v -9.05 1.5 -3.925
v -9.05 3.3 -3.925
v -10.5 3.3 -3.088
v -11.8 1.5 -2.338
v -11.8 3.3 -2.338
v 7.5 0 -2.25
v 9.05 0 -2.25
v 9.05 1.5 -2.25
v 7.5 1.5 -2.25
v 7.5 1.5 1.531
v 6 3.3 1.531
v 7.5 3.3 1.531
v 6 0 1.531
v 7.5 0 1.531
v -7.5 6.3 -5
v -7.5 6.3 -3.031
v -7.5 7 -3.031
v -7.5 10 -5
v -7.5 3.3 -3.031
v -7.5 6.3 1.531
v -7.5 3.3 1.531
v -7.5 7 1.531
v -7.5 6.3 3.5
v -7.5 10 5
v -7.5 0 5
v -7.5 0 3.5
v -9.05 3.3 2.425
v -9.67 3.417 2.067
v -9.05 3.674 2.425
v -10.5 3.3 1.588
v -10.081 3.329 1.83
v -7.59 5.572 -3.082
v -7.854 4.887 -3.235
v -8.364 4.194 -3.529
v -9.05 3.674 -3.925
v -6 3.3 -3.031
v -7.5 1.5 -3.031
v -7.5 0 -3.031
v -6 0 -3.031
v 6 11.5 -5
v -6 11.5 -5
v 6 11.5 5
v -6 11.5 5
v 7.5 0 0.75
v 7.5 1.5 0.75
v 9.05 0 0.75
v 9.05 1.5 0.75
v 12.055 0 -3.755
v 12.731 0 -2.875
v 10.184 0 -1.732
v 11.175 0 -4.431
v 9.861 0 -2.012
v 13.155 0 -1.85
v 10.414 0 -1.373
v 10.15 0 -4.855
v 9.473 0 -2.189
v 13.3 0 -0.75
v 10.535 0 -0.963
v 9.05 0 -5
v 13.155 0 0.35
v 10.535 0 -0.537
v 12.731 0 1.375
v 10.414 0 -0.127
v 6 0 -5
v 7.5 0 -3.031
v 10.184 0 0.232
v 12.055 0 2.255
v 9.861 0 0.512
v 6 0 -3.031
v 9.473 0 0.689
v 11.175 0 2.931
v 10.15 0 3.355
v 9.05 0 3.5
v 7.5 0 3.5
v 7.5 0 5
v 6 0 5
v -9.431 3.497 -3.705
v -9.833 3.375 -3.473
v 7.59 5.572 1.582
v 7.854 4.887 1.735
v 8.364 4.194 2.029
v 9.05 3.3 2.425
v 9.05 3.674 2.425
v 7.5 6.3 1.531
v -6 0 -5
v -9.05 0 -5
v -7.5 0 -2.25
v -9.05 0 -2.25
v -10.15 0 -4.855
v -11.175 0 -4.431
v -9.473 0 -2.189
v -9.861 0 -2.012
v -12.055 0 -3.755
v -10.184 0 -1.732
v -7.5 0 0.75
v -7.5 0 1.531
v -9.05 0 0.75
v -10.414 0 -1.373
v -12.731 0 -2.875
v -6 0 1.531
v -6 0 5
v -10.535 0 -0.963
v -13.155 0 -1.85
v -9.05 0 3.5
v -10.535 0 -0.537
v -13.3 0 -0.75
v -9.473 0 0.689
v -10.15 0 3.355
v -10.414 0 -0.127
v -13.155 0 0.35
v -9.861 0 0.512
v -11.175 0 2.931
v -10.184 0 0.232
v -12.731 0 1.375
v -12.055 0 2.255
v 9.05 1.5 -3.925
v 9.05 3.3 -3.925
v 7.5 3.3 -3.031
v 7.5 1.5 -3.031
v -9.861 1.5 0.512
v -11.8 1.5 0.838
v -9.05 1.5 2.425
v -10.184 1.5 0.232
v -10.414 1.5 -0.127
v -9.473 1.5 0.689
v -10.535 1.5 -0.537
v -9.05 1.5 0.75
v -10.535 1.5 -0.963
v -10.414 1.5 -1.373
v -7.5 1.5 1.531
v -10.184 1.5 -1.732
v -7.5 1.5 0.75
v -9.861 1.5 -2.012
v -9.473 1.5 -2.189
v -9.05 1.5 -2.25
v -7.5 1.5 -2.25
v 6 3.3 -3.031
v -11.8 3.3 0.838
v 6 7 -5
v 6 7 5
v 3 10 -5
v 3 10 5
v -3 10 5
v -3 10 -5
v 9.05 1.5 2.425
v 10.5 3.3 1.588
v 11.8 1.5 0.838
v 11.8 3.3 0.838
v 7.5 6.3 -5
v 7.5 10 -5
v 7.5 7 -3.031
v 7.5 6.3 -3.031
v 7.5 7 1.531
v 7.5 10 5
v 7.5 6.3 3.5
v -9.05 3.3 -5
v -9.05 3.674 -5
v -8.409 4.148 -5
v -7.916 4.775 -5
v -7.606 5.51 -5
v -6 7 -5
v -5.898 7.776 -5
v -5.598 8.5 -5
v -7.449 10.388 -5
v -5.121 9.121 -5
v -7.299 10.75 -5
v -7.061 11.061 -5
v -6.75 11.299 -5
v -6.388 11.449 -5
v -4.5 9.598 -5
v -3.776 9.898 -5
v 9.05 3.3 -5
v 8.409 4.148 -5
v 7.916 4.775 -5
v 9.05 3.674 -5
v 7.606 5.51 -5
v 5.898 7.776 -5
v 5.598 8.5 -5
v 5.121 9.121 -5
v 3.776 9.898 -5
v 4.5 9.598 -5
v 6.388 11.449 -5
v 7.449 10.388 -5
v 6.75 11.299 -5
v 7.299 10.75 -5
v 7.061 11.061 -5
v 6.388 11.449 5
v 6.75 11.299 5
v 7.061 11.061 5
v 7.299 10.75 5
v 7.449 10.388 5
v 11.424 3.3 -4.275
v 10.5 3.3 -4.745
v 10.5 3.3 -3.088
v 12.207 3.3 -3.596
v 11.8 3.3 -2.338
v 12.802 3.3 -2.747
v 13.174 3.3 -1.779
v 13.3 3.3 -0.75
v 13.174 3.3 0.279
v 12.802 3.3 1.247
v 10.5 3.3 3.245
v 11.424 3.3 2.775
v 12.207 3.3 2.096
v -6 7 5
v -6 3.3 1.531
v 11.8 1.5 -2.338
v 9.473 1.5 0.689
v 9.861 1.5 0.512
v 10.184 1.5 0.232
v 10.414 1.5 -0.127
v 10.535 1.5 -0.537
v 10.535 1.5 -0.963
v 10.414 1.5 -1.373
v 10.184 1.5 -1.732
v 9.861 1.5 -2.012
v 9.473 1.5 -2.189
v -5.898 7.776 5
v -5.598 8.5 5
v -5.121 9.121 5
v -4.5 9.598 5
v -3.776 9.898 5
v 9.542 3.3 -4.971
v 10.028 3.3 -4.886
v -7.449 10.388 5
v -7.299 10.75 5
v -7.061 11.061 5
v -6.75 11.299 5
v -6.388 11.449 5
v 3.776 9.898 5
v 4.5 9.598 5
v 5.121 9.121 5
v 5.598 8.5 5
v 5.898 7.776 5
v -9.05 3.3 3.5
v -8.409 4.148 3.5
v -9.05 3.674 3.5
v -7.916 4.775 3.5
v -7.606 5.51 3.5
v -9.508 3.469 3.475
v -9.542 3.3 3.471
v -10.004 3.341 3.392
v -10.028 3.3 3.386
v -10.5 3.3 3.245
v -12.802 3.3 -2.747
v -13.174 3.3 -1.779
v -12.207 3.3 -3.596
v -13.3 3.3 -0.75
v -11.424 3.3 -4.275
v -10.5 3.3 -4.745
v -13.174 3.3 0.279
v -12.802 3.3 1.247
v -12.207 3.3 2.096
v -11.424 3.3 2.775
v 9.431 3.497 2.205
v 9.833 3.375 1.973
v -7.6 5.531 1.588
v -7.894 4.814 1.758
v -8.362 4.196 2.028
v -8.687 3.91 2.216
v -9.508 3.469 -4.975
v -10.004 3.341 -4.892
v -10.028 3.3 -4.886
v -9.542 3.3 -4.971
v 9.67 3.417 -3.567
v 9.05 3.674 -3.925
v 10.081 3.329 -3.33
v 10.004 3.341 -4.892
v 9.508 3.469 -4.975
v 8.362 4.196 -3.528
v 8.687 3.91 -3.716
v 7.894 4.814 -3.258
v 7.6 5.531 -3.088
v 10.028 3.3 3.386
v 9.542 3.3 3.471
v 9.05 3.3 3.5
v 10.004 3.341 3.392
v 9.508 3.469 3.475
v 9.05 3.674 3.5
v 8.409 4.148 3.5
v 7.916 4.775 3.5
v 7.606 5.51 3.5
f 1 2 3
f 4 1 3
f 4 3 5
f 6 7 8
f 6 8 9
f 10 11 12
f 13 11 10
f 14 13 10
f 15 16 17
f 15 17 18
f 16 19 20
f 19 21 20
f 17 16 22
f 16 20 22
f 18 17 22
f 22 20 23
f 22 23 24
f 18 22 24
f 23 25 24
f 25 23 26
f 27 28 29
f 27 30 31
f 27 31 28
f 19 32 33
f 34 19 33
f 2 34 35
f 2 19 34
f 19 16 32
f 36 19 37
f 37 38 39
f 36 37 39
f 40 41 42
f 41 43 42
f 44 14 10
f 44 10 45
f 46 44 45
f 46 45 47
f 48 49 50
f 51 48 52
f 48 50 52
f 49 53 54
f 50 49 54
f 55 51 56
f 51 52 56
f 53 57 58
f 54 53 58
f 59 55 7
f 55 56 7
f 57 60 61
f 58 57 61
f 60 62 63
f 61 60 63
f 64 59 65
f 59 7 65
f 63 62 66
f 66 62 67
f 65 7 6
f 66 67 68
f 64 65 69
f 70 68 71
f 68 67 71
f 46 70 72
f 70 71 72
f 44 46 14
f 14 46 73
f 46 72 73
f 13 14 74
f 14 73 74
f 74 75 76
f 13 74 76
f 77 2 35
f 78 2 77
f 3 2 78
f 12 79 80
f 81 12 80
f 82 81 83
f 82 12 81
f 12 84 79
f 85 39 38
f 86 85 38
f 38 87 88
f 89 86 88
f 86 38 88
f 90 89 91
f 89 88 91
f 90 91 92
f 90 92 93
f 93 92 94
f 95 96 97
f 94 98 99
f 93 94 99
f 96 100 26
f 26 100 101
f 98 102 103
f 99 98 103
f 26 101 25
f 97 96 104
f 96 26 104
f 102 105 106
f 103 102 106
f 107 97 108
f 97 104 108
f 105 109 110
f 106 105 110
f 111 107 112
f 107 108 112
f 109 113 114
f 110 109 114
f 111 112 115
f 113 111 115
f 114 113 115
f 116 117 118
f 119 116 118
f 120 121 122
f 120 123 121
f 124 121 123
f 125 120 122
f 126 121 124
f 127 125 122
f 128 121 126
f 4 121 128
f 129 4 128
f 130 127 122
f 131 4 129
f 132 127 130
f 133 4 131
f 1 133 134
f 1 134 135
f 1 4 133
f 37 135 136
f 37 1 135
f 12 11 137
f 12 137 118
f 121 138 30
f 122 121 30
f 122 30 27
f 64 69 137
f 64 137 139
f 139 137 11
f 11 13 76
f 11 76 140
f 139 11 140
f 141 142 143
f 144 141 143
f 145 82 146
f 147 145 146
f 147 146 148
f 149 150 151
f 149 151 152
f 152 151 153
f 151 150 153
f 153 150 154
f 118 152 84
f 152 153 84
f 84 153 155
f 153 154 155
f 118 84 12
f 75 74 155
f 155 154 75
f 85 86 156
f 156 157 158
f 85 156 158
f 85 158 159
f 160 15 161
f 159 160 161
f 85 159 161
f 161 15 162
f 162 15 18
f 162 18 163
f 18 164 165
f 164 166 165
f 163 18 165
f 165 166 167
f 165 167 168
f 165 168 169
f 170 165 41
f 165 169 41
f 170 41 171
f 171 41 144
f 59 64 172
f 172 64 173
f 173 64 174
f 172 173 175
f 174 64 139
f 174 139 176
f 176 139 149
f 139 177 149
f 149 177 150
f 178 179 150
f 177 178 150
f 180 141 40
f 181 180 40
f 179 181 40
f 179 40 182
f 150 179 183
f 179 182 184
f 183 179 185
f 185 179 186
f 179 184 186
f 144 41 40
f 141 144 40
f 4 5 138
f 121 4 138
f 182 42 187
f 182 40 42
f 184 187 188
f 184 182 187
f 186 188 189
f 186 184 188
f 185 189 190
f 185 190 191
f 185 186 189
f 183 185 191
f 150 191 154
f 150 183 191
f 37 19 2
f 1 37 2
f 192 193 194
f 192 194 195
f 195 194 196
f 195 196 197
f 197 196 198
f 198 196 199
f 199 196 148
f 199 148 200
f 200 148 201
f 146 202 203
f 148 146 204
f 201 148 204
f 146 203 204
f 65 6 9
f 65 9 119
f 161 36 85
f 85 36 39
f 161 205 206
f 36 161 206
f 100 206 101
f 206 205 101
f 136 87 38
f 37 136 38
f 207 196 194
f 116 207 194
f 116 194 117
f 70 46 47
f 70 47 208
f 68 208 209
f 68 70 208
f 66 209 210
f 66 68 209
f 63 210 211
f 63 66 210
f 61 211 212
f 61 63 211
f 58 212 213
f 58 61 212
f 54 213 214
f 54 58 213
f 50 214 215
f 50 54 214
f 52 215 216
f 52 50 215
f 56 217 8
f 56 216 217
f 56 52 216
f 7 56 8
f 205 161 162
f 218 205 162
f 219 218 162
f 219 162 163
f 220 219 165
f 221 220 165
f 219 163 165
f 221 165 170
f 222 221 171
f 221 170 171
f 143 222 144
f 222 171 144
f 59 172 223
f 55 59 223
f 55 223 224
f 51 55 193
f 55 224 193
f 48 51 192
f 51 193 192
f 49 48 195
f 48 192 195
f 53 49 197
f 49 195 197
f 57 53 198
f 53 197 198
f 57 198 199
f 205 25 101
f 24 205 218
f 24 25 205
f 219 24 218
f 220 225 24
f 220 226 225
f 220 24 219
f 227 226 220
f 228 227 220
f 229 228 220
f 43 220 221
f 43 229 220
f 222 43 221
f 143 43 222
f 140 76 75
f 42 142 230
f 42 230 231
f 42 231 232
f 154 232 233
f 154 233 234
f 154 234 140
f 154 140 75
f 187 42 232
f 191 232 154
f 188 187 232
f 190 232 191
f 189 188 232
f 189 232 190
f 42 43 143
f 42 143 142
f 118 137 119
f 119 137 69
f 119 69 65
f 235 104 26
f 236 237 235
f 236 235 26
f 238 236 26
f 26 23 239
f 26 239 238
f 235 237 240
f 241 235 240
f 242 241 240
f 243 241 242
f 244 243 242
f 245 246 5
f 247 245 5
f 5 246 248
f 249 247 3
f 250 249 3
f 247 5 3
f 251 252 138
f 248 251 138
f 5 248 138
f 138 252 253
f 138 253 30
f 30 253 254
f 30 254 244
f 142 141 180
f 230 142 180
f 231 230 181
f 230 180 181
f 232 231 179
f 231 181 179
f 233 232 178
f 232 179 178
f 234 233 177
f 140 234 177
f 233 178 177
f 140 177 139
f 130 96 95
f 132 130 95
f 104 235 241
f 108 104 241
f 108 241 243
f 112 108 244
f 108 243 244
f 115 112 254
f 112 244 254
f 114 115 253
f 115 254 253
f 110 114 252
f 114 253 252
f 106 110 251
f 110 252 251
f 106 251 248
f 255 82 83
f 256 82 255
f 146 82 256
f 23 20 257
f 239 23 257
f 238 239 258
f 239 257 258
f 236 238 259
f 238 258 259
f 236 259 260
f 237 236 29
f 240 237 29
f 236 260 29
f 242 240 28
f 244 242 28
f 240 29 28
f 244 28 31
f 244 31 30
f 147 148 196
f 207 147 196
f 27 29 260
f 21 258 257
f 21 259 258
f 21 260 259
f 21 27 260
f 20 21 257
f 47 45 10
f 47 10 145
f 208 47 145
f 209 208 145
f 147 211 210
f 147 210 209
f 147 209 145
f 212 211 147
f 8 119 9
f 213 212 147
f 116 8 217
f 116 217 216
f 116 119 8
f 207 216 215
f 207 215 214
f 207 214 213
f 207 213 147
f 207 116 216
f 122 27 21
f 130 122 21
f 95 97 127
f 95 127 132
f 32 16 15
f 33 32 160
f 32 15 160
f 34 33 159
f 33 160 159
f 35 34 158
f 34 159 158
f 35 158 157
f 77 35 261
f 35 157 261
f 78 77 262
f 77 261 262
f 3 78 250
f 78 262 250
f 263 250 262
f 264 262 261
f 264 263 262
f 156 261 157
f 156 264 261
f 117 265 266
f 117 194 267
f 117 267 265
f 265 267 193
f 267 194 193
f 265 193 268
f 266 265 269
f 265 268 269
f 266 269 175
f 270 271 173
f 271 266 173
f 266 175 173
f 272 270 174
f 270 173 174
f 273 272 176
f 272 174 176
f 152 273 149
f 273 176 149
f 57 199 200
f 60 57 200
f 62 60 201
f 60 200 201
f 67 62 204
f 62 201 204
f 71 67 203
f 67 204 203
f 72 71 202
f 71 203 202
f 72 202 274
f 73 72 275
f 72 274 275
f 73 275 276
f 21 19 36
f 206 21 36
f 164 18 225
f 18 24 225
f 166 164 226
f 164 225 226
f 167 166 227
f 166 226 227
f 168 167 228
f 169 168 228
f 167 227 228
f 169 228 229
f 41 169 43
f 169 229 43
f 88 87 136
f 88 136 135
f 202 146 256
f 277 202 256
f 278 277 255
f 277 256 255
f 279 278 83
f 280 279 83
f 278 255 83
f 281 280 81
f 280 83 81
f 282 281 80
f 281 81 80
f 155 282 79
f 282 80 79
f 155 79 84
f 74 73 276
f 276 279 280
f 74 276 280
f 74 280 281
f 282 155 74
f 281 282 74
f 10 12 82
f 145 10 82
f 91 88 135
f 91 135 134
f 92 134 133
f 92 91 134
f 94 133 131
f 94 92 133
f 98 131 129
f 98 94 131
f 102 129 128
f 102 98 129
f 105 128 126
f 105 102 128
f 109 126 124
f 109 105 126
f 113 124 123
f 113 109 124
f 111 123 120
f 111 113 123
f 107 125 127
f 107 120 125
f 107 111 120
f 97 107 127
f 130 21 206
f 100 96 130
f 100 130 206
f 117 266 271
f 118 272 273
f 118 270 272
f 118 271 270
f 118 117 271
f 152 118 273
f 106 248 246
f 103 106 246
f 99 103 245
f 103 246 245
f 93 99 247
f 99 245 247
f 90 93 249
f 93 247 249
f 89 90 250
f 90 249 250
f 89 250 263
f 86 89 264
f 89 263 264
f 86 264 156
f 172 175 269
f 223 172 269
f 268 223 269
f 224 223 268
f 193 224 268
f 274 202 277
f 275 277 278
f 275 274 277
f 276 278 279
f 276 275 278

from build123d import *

# Parameters (mm, degrees)
BOSS_EXTRUDE1_DEPTH = 5
CUT_EXTRUDE1_REACH  = 18.405
CUT_EXTRUDE2_DEPTH  = 1.8
FILLET1_START       = -5
FILLET1_DEPTH       = 10
FILLET1_2_DEPTH     = 1.969466537
FILLET1_START_2     = 1.530533463
FILLET1_3_DEPTH     = 1.969466537
FILLET1_START_3     = 3.3
FILLET1_4_DEPTH     = 3.7
FILLET2_R           = 1.5
CUT_EXTRUDE3_DEPTH  = 3
CUT_EXTRUDE4_REACH  = 20.279
SKETCH5_W           = 15
SKETCH5_H           = 4.561067126


with BuildPart() as part:
    # Sketch1 → Boss-Extrude1 (new, symmetric)
    with BuildSketch(Plane.XY):
        Polygon((-7.5, 11.5), (7.5, 11.5), (7.5, 3.3), (13.3, 3.3), (13.3, 0), (6, 0), (6, 10), (-6, 10), (-6, 0), (-13.3, 0), (-13.3, 3.3), (-7.5, 3.3), align=None)
    extrude(amount=BOSS_EXTRUDE1_DEPTH, both=True)

    # Sketch2 → Cut-Extrude1 (cut, up to next)
    with BuildSketch(Plane(origin=(0, 3.3, 0), x_dir=(1, 0, 0), z_dir=(0, 1, 0)), mode=Mode.PRIVATE) as cut_extrude1_sk1:
        with BuildLine():
            ThreePointArc((-9.05, -3.5), (-12.05520382, -2.25520382), (-13.3, 0.75))
            Line((-13.3, 0.75), (-13.3, -5))
            Line((-13.3, -5), (-7.5, -5))
            Line((-7.5, -5), (-7.5, -3.5))
            Line((-7.5, -3.5), (-9.05, -3.5))
        make_face()
    cut_extrude1_tool1 = extrude(cut_extrude1_sk1.sketch, amount=-CUT_EXTRUDE1_REACH, mode=Mode.PRIVATE) & part.part
    # Sketch2 → Cut-Extrude1 (cut, up to next)
    with BuildSketch(Plane(origin=(0, 3.3, 0), x_dir=(1, 0, 0), z_dir=(0, 1, 0)), mode=Mode.PRIVATE) as cut_extrude1_sk2:
        with BuildLine():
            ThreePointArc((-13.3, 0.75), (-12.05520382, 3.75520382), (-9.05, 5))
            Line((-9.05, 5), (-13.3, 5))
            Line((-13.3, 5), (-13.3, 0.75))
        make_face()
    cut_extrude1_tool2 = extrude(cut_extrude1_sk2.sketch, amount=-CUT_EXTRUDE1_REACH, mode=Mode.PRIVATE) & part.part
    # Sketch2 → Cut-Extrude1 (cut, up to next)
    with BuildSketch(Plane(origin=(0, 3.3, 0), x_dir=(1, 0, 0), z_dir=(0, 1, 0)), mode=Mode.PRIVATE) as cut_extrude1_sk3:
        with BuildLine():
            ThreePointArc((9.05, 5), (12.05520382, 3.75520382), (13.3, 0.75))
            Line((13.3, 0.75), (13.3, 5))
            Line((13.3, 5), (9.05, 5))
        make_face()
    cut_extrude1_tool3 = extrude(cut_extrude1_sk3.sketch, amount=-CUT_EXTRUDE1_REACH, mode=Mode.PRIVATE) & part.part
    # Sketch2 → Cut-Extrude1 (cut, up to next)
    with BuildSketch(Plane(origin=(0, 3.3, 0), x_dir=(1, 0, 0), z_dir=(0, 1, 0)), mode=Mode.PRIVATE) as cut_extrude1_sk4:
        with BuildLine():
            ThreePointArc((13.3, 0.75), (12.05520382, -2.25520382), (9.05, -3.5))
            Line((9.05, -3.5), (7.5, -3.5))
            Line((7.5, -3.5), (7.5, -5))
            Line((7.5, -5), (13.3, -5))
            Line((13.3, -5), (13.3, 0.75))
        make_face()
    cut_extrude1_tool4 = extrude(cut_extrude1_sk4.sketch, amount=-CUT_EXTRUDE1_REACH, mode=Mode.PRIVATE) & part.part
    add(cut_extrude1_tool1.solids().sort_by_distance((-11.00124, 3.3, 3.726238))[0], mode=Mode.SUBTRACT)
    add(cut_extrude1_tool2.solids().sort_by_distance((-12.350686, 3.3, -4.050686))[0], mode=Mode.SUBTRACT)
    add(cut_extrude1_tool3.solids().sort_by_distance((12.350686, 3.3, -4.050686))[0], mode=Mode.SUBTRACT)
    add(cut_extrude1_tool4.solids().sort_by_distance((11.00124, 3.3, 3.726238))[0], mode=Mode.SUBTRACT)

    # Sketch3 → Cut-Extrude2 (cut)
    with BuildSketch(Plane(origin=(0, 3.3, 0), x_dir=(1, 0, 0), z_dir=(0, 1, 0))):
        Polygon((-9.05, 3.925426481), (-11.8, 2.33771324), (-11.8, -0.83771324), (-9.05, -2.425426481), (-6.3, -0.83771324), (-6.3, 2.33771324), align=None)
        Polygon((9.05, 3.925426481), (6.3, 2.33771324), (6.3, -0.83771324), (9.05, -2.425426481), (11.8, -0.83771324), (11.8, 2.33771324), align=None)
    extrude(amount=-CUT_EXTRUDE2_DEPTH, mode=Mode.SUBTRACT)

    # Fillet1: read off the stored shape, not the designer's step
    # Fillet1 outline → Fillet1 (add)
    with BuildSketch(Plane.XY.offset(FILLET1_START)):
        with BuildLine():
            ThreePointArc((-6, 7), (-5.121320344, 9.121320344), (-3, 10))
            Line((-3, 10), (-6, 10))
            Line((-6, 10), (-6, 7))
        make_face()
        with BuildLine():
            ThreePointArc((3, 10), (5.121320344, 9.121320344), (6, 7))
            Line((6, 7), (6, 10))
            Line((6, 10), (3, 10))
        make_face()
    extrude(amount=FILLET1_DEPTH)

    # Fillet1 2 outline → Fillet1 2 (add)
    with BuildSketch(Plane.XY.offset(FILLET1_START)):
        with BuildLine():
            ThreePointArc((-7.5, 6.3), (-8.378679656, 4.178679656), (-10.5, 3.3))
            Line((-10.5, 3.3), (-7.5, 3.3))
            Line((-7.5, 3.3), (-7.5, 6.3))
        make_face()
        with BuildLine():
            ThreePointArc((10.5, 3.3), (8.378679656, 4.178679656), (7.5, 6.3))
            Line((7.5, 6.3), (7.5, 3.3))
            Line((7.5, 3.3), (10.5, 3.3))
        make_face()
    extrude(amount=FILLET1_2_DEPTH)

    # Fillet1 3 outline → Fillet1 3 (add)
    with BuildSketch(Plane.XY.offset(FILLET1_START_2)):
        with BuildLine():
            ThreePointArc((-7.5, 6.3), (-8.378679656, 4.178679656), (-10.5, 3.3))
            Line((-10.5, 3.3), (-7.5, 3.3))
            Line((-7.5, 3.3), (-7.5, 6.3))
        make_face()
        with BuildLine():
            ThreePointArc((10.5, 3.3), (8.378679656, 4.178679656), (7.5, 6.3))
            Line((7.5, 6.3), (7.5, 3.3))
            Line((7.5, 3.3), (10.5, 3.3))
        make_face()
    extrude(amount=FILLET1_3_DEPTH)

    # Fillet1 4 outline → Fillet1 4 (cut)
    with BuildSketch(Plane(origin=(0, 0, 0), x_dir=(1, 0, 0), z_dir=(0, 1, 0)).offset(FILLET1_START_3)):
        with BuildLine():
            ThreePointArc((10.5, -3.244996871), (9.786126109, -3.435763772), (9.05, -3.5))
            Line((9.05, -3.5), (10.5, -3.5))
            Line((10.5, -3.5), (10.5, -3.244996871))
        make_face()
        Polygon((9.05, 3.925426481), (7.5, 3.030533563), (10.5, 3.030533463), (10.5, 3.08826859), align=None)
        Polygon((10.5, -1.530533463), (7.5, -1.530533463), (9.05, -2.425426481), (10.5, -1.58826859), align=None)
        with BuildLine():
            Line((10.5, 5), (9.05, 5))
            ThreePointArc((9.05, 5), (9.786126109, 4.935763772), (10.5, 4.744996871))
            Line((10.5, 4.744996871), (10.5, 5))
        make_face()
        with BuildLine():
            ThreePointArc((-9.05, -3.5), (-9.786126109, -3.435763772), (-10.5, -3.244996871))
            Line((-10.5, -3.244996871), (-10.5, -3.5))
            Line((-10.5, -3.5), (-9.05, -3.5))
        make_face()
        Polygon((-9.05, 3.925426481), (-10.5, 3.08826859), (-10.5, 3.030533463), (-7.5, 3.030533463), align=None)
        Polygon((-7.5, -1.530533463), (-10.5, -1.530533463), (-10.5, -1.58826859), (-9.05, -2.425426481), align=None)
        with BuildLine():
            Line((-9.05, 5), (-10.5, 5))
            Line((-10.5, 5), (-10.5, 4.744996871))
            ThreePointArc((-10.5, 4.744996871), (-9.786126109, 4.935763772), (-9.05, 5))
        make_face()
    extrude(amount=FILLET1_4_DEPTH, mode=Mode.SUBTRACT)

    # Fillet2
    fillet2_edges = [part.edges().sort_by_distance(p)[0] for p in [
        (-7.5, 11.5, 0),
        (7.5, 11.5, 0),
    ]]
    fillet(fillet2_edges, radius=FILLET2_R)

    # Sketch4 → Cut-Extrude3 (cut)
    with BuildSketch(Plane(origin=(0, 0, 0), x_dir=(1, 0, 0), z_dir=(0, 1, 0))):
        with BuildLine():
            Line((-9.05, -0.75), (9.05, -0.75))
            ThreePointArc((9.05, -0.75), (10.55, 0.75), (9.05, 2.25))
            Line((9.05, 2.25), (-9.05, 2.25))
            ThreePointArc((-9.05, 2.25), (-10.55, 0.75), (-9.05, -0.75))
        make_face()
    extrude(amount=CUT_EXTRUDE3_DEPTH, mode=Mode.SUBTRACT)

    # Cut-Extrude4: up to this face of the body (flat: up to its plane)
    cut_extrude4_end = Plane(part.part.faces().sort_by_distance((6.935820896, 3.3, -0.75))[0])
    # Sketch5 → Cut-Extrude4 (cut, up to the picked face)
    with BuildSketch(Plane(origin=(0, 0, 0), x_dir=(1, 0, 0), z_dir=(0, 1, 0)), mode=Mode.PRIVATE) as cut_extrude4_sk1:
        with Locations((0, 0.75)):
            Rectangle(SKETCH5_W, SKETCH5_H)
    cut_extrude4_tool1 = split(extrude(cut_extrude4_sk1.sketch, amount=CUT_EXTRUDE4_REACH, mode=Mode.PRIVATE), bisect_by=cut_extrude4_end, keep=Keep.BOTH, mode=Mode.PRIVATE)
    add(cut_extrude4_tool1.solids().sort_by(Axis((0, 0, -0.75), (0, 1, 0)))[0], mode=Mode.SUBTRACT)


solid = part.part
